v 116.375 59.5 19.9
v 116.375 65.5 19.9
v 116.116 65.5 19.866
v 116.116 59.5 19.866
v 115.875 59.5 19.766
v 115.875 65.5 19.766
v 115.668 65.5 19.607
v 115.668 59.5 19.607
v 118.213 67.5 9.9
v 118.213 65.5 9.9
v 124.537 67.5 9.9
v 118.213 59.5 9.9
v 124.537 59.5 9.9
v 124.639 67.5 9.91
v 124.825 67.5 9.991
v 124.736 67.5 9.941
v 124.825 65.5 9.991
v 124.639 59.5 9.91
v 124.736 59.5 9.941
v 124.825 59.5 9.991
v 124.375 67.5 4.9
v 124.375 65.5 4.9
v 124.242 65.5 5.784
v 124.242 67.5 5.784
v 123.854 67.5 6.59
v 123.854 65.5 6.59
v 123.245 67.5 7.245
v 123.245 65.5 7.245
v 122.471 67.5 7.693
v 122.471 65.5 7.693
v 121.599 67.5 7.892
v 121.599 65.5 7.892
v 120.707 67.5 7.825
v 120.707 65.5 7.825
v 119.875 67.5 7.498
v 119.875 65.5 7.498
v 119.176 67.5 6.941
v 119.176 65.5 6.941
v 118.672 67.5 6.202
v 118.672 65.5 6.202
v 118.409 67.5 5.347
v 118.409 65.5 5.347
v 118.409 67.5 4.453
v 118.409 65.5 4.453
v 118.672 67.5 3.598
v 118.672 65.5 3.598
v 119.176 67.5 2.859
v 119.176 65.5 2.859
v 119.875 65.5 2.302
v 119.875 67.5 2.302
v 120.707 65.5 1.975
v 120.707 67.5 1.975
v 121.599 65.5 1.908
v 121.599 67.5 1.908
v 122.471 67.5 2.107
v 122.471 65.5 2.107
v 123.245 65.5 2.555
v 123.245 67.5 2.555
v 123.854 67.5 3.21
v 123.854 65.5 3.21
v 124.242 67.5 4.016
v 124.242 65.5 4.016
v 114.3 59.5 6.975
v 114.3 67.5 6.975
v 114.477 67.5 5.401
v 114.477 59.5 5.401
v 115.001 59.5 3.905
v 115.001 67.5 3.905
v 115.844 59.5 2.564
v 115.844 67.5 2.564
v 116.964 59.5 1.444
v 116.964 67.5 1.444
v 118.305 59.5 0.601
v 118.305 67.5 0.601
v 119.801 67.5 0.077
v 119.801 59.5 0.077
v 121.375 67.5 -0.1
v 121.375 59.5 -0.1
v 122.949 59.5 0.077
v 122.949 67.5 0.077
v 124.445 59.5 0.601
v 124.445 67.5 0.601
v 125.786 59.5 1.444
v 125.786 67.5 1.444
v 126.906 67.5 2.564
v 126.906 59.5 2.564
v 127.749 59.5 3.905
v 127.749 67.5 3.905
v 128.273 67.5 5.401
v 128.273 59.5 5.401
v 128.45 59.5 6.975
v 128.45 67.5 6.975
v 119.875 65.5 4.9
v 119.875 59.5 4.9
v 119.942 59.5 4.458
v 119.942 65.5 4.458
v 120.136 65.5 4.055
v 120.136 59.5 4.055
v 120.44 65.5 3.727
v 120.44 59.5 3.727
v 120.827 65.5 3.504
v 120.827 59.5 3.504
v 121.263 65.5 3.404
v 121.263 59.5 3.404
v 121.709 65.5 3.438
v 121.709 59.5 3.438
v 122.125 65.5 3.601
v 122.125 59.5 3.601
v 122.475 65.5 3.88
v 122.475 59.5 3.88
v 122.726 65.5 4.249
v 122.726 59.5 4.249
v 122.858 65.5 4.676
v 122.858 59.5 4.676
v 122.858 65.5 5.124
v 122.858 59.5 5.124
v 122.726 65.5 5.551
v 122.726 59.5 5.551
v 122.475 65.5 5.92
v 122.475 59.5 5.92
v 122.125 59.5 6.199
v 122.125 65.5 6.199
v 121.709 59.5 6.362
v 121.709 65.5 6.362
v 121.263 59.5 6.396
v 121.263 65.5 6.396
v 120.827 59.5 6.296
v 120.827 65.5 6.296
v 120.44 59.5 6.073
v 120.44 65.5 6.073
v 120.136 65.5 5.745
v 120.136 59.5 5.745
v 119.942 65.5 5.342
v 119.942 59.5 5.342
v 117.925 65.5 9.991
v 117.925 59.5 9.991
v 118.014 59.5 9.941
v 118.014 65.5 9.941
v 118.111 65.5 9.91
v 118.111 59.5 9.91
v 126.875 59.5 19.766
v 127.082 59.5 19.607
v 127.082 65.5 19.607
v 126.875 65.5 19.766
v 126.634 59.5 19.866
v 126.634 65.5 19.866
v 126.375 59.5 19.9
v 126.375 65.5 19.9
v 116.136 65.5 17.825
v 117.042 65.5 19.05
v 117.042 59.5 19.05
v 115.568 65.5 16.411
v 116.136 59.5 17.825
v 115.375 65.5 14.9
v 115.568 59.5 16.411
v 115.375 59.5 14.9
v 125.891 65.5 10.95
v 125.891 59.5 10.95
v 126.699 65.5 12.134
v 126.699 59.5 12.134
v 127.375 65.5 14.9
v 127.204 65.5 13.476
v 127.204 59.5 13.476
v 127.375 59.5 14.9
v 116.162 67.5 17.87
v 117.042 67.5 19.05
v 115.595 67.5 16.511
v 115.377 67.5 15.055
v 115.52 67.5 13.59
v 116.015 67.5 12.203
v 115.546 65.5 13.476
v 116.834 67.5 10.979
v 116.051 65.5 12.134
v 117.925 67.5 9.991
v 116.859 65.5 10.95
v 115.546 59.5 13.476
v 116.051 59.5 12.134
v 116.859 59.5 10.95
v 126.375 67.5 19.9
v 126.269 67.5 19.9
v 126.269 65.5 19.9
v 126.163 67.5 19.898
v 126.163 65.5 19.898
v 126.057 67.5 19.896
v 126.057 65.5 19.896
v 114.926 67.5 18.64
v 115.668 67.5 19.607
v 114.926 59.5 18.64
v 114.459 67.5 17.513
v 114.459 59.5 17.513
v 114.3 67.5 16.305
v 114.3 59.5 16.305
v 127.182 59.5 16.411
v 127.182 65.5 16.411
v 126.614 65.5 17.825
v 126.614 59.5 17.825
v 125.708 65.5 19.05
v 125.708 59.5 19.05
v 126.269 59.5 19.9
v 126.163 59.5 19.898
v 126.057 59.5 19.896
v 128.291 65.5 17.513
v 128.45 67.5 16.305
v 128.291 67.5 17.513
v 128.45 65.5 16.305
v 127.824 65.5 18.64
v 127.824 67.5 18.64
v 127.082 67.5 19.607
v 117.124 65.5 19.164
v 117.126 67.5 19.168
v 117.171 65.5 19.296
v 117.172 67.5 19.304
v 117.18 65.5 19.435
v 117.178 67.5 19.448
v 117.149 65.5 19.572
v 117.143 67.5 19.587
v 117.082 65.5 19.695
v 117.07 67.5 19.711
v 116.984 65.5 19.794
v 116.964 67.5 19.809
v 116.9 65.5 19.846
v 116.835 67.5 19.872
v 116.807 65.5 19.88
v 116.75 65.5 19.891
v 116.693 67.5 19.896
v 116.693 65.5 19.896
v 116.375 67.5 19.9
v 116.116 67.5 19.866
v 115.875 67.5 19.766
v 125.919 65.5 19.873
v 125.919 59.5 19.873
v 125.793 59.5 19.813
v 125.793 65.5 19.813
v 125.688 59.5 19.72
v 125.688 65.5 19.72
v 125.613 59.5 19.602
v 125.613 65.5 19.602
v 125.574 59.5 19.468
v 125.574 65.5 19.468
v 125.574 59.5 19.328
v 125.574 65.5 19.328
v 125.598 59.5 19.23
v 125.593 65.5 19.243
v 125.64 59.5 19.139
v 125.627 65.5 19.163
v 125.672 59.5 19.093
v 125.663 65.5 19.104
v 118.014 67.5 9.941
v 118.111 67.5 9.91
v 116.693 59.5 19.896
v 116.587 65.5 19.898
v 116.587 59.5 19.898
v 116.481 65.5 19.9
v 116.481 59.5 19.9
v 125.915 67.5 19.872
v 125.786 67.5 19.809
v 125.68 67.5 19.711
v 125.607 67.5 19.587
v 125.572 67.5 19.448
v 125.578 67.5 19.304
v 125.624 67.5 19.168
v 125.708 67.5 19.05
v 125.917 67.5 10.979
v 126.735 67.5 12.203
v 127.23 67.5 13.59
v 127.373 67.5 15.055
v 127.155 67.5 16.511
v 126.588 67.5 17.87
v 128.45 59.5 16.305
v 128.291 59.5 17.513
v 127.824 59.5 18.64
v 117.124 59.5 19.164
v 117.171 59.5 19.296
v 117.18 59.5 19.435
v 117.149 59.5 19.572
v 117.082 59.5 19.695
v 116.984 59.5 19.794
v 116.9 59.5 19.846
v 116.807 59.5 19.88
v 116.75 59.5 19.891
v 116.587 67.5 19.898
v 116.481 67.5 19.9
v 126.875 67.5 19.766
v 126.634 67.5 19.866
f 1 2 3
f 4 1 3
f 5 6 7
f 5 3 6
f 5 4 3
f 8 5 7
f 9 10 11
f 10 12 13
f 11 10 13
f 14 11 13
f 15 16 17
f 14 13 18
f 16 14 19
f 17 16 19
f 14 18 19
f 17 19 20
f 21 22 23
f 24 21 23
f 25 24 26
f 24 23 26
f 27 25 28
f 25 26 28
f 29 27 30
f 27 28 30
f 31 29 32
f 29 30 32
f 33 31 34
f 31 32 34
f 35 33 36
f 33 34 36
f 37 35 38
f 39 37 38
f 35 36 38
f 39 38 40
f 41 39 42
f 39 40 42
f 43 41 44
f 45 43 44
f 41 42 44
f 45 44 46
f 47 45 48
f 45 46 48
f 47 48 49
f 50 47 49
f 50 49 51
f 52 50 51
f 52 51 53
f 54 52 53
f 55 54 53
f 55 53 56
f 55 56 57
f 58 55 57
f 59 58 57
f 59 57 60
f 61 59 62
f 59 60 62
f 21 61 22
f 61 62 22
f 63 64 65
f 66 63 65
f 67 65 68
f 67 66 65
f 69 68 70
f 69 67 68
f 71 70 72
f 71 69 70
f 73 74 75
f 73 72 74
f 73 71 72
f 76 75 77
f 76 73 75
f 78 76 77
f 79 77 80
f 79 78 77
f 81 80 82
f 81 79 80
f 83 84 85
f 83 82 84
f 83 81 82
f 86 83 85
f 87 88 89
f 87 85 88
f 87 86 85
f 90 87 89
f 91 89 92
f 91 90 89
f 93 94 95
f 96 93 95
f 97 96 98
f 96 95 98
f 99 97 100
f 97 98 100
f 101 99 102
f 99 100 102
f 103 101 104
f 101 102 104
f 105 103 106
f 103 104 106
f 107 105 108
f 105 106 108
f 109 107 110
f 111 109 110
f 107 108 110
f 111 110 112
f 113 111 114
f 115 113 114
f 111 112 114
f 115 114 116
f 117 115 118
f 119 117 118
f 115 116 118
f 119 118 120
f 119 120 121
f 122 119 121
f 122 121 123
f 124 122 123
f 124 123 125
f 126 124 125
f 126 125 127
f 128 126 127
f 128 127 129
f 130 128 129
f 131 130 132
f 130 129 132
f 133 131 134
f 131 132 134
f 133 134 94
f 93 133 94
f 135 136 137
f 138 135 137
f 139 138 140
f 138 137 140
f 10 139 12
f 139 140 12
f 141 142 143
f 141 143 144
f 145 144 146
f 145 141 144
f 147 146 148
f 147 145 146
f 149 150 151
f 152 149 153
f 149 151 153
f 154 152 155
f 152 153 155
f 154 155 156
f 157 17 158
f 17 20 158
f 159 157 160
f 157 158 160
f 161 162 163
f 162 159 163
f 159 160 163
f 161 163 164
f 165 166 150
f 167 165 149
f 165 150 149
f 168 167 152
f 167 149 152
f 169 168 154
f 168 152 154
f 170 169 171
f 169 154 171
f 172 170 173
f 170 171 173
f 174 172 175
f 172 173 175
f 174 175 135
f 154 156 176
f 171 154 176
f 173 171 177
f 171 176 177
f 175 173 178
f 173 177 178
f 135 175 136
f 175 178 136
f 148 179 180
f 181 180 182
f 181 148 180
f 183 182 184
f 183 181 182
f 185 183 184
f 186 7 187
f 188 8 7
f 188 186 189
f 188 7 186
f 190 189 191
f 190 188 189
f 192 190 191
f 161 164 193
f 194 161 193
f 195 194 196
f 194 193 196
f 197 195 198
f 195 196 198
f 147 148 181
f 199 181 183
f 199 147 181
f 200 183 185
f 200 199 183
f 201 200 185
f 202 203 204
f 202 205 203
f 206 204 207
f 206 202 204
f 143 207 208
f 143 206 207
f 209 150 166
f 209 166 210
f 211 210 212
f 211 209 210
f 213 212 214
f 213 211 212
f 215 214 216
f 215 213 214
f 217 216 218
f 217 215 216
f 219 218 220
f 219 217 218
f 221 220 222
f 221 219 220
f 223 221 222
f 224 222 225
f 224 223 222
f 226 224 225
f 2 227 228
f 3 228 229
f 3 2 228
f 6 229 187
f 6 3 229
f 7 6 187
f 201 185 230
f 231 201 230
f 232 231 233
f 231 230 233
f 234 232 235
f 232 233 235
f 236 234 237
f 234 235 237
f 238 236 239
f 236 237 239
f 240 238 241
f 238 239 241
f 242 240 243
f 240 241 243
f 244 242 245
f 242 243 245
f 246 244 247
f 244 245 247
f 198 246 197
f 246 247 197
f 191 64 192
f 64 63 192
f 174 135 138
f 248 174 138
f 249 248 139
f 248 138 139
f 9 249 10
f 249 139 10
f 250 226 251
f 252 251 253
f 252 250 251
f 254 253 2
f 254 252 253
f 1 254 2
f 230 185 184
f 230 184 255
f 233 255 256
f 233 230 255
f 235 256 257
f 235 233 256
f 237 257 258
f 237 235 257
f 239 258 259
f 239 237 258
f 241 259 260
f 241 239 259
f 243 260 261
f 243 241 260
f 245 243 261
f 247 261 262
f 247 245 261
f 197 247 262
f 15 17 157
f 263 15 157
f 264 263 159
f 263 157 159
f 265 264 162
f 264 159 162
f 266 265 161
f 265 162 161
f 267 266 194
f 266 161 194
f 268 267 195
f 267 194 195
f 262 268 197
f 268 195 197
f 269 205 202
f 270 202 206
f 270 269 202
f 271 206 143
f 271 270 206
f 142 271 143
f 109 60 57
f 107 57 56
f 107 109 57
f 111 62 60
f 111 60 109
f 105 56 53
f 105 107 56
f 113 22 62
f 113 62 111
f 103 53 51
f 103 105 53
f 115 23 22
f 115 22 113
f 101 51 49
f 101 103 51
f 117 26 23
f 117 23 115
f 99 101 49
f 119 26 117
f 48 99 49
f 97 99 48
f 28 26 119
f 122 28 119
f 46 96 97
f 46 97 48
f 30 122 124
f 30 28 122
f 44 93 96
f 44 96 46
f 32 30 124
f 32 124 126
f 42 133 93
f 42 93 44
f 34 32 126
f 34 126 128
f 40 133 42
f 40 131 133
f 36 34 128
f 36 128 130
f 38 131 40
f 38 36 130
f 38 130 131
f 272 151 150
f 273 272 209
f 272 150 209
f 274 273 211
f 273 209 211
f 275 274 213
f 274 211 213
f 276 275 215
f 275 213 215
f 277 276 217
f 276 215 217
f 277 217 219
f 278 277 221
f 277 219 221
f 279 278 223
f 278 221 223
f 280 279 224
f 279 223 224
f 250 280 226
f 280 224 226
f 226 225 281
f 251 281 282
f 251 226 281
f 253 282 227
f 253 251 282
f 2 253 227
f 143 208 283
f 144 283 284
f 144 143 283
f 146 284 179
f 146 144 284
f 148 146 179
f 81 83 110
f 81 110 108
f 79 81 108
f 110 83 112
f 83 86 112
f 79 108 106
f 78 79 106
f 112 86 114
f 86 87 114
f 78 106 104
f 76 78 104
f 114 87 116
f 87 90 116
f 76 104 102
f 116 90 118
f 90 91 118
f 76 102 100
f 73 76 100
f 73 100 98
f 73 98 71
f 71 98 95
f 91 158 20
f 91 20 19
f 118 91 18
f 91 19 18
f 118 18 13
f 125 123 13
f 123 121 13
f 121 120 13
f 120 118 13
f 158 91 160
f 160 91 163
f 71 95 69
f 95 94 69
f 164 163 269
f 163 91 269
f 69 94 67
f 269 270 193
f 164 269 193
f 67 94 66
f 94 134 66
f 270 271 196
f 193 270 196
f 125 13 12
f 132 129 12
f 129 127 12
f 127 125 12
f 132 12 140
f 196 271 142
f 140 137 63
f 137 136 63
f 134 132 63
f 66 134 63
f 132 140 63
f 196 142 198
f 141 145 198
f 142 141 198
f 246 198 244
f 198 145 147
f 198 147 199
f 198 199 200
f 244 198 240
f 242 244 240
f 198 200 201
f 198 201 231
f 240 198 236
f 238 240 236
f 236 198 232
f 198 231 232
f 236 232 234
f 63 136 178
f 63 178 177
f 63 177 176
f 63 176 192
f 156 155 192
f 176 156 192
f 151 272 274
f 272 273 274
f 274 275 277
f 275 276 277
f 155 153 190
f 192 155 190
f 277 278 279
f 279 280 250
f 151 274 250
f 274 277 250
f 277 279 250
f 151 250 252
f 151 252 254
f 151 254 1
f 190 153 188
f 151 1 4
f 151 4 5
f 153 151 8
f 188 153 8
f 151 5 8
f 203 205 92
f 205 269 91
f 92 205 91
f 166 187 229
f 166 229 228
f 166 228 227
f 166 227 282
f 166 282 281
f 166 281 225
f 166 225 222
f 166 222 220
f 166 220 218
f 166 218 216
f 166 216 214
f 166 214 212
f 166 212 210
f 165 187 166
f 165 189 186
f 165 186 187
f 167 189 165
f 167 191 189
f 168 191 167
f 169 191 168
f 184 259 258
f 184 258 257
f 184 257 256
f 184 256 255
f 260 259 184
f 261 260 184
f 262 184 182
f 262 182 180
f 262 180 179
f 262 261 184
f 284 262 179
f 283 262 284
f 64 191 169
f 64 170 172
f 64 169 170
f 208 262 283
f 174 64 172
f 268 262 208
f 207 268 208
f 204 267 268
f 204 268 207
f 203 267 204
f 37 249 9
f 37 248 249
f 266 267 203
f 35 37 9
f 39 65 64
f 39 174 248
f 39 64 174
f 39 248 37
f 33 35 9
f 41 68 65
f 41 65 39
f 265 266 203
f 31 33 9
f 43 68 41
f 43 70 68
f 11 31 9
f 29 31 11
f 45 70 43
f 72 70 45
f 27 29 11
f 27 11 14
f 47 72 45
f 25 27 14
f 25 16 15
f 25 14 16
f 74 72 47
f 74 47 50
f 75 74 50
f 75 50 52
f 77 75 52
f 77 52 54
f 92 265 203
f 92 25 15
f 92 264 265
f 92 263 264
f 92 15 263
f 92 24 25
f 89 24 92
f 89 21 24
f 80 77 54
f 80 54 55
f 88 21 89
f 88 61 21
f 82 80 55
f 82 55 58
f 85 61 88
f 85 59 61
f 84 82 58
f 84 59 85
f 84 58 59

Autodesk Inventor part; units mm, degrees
ref_plane "YZ Plane" through (0, 0, 0) normal (1, 0, 0) x (0, 1, 0)
ref_plane "XZ Plane" through (0, 0, 0) normal (0, 1, 0) x (-1, 0, 0)
sketch "Sketch1" plane through (0, 0, 0) normal (0, 1, 0) x (-1, 0, 0)
  line L0 (-113.9895, -20.65) -> (-113.9895, -0.1) projected
  line L1 (-105.9, -20.65) -> (-113.9895, -20.65) projected
  line L2 (-105.9, -20.65) -> (-105.9, -19.5) projected
  line L3 (-105.9, -19.5) -> (-112.525, -19.5) projected
  line L4 (-112.525, -19.5) -> (-112.525, 19.5) projected
  line L5 (-112.525, 19.5) -> (-73.775, 19.5) projected
  line L6 (-127.45, 19.9) -> (-115.3, 19.9) projected
  line L7 (-115.3, 19.9) -> (-115.3, 9.9) projected
  line L8 (-115.3, 9.9) -> (-127.45, 9.9) projected
  line L9 (-127.45, 9.9) -> (-127.45, 19.9) projected
  line L10 (-124.5373, 9.9) -> (-126.375, 9.9) projected
  arc A0 (-124.8248, 9.9909) -> (-124.5373, 9.9) centre (-124.5373, 10.4) ccw projected
  arc A1 (-127.375, 14.9) -> (-124.8248, 9.9909) centre (-121.375, 14.9) ccw projected
  line L11 (-127.375, 10.9) -> (-127.375, 14.9) projected
  arc A2 (-127.375, 10.9) -> (-126.375, 9.9) centre (-126.375, 10.9) ccw projected
  line L12 (-127.375, 14.9) -> (-127.375, 18.9) projected
  arc A3 (-124.8248, 19.8091) -> (-127.375, 14.9) centre (-121.375, 14.9) ccw projected
  arc A4 (-124.5373, 19.9) -> (-124.8248, 19.8091) centre (-124.5373, 19.4) ccw projected
  line L13 (-126.375, 19.9) -> (-124.5373, 19.9) projected
  arc A5 (-126.375, 19.9) -> (-127.375, 18.9) centre (-126.375, 18.9) ccw projected
  line L14 (-118.2127, 19.9) -> (-116.375, 19.9) projected
  arc A6 (-117.9252, 19.8091) -> (-118.2127, 19.9) centre (-118.2127, 19.4) ccw projected
  arc A7 (-115.375, 14.9) -> (-117.9252, 19.8091) centre (-121.375, 14.9) ccw projected
  line L15 (-115.375, 18.9) -> (-115.375, 14.9) projected
  arc A8 (-115.375, 18.9) -> (-116.375, 19.9) centre (-116.375, 18.9) ccw projected
  line L16 (-115.375, 14.9) -> (-115.375, 10.9) projected
  arc A9 (-117.9252, 9.9909) -> (-115.375, 14.9) centre (-121.375, 14.9) ccw projected
  arc A10 (-118.2127, 9.9) -> (-117.9252, 9.9909) centre (-118.2127, 10.4) ccw projected
  line L17 (-116.375, 9.9) -> (-118.2127, 9.9) projected
  arc A11 (-116.375, 9.9) -> (-115.375, 10.9) centre (-116.375, 10.9) ccw projected
  arc A12 (-118.2127, 9.9) -> (-117.9252, 9.9909) centre (-118.2127, 10.4) ccw projected
  arc A13 (-117.9252, 9.9909) -> (-117.9252, 19.8091) centre (-121.375, 14.9) ccw projected
  arc A14 (-117.9252, 19.8091) -> (-118.2127, 19.9) centre (-118.2127, 19.4) ccw projected
  line L18 (-118.2127, 19.9) -> (-124.5373, 19.9) projected
  arc A15 (-124.5373, 19.9) -> (-124.8248, 19.8091) centre (-124.5373, 19.4) ccw projected
  arc A16 (-124.8248, 19.8091) -> (-124.8248, 9.9909) centre (-121.375, 14.9) ccw projected
  arc A17 (-124.8248, 9.9909) -> (-124.5373, 9.9) centre (-124.5373, 10.4) ccw projected
  line L19 (-124.5373, 9.9) -> (-118.2127, 9.9) projected
  line L20 (-73.775, 19.5) -> (-73.775, 20.65) projected
  line L21 (-115.3, 19.9) -> (-115.3, 9.9)
  line L22 (-115.3, 9.9) -> (-114.3, 9.9)
  line L23 (-114.3, 9.9) -> (-114.3, 19.9)
  line L24 (-114.3, 19.9) -> (-115.3, 19.9)
  line L25 (-121.375, 14.9) -> (-121.375, 19.9)
  arc A18 (-114.3, 16.3047) -> (-115.6679, 19.6071) centre (-118.9703, 16.3047) ccw
  arc A19 (-116.375, 19.9) -> (-117.9252, 19.8091) centre (-116.375, 6.6367) ccw
  line L26 (-127.45, 19.9) -> (-127.45, 9.9)
  line L27 (-127.45, 9.9) -> (-128.45, 9.9)
  line L28 (-128.45, 9.9) -> (-128.45, 19.9)
  line L29 (-128.45, 19.9) -> (-127.45, 19.9)
  arc A20 (-127.0821, 19.6071) -> (-128.45, 16.3047) centre (-123.7797, 16.3047) ccw
  arc A21 (-124.8248, 19.8091) -> (-126.375, 19.9) centre (-126.375, 6.6367) ccw
  line L30 (-114.3, 9.9) -> (-128.45, 9.9)
  line L31 (-128.45, 9.9) -> (-128.45, -0.1)
  line L32 (-128.45, -0.1) -> (-114.3, -0.1)
  line L33 (-114.3, -0.1) -> (-114.3, 9.9)
  line L34 (-121.375, 9.9) -> (-121.375, -0.1)
  circle A22 centre (-121.375, 4.9) radius 1.5
  circle A23 centre (-121.375, 4.9) radius 3
  arc A24 (-121.375, -0.1) -> (-114.3, 6.975) centre (-121.375, 6.975) ccw
  arc A25 (-128.45, 6.975) -> (-121.375, -0.1) centre (-121.375, 6.975) ccw
  line L35 (-128.9145, -0.1) -> (-128.9145, 20.65) projected
  line L36 (-128.9145, -0.1) -> (-113.9895, -0.1) projected
  line L37 (-128.9145, 20.65) -> (-73.775, 20.65) projected
  circle A26 centre (-121.375, 4.9163) radius 1.4375 projected
  point P0 (0, 0)
  point P1 (-135.6645, 14.9)
  dimension "d18" = 1
  dimension "d20" = 3
  dimension "d21" = 6
  dimension "d22" = 10
ref_plane "Work Plane1" through (127.45, 59.5, 9.9) normal (0, 1, 0) x (1, 0, 0)
extrude "Extrusion1" add sketch "Sketch1" along normal blind 6 from surface at 59.5 contours A25 L31 L27 L8 L34 A23 | L34 A23 L8 L22 L33 A24 | A23 L34 A22 | L34 A22 A23 | L22 L7 A18 L23 | L28 A20 L9 L27 | L8 A11 L16 L15 A8 A18 L7 | L9 A20 A5 L12 L11 A2 L8 | L8 A10 A9 L16 A11 | L8 A2 L11 A1 A0 | A8 L15 A7 A19 | A5 A21 A3 L12
fillet "Fillet1" radius 0.5 2 edges at (117.9252, 62.5, 19.8091) (124.8248, 62.5, 19.8091)
sketch "Sketch2" plane through (118.1857, 65.5, 20.6175) normal (0, 1, 0) x (1, 0, 0)
  arc A0 (-0.2604, 10.6266) -> (-1.1435, 1.567) centre (3.1893, 5.7175) ccw projected
  arc A1 (0.0271, 10.7175) -> (-0.2604, 10.6266) centre (0.0271, 10.2175) ccw projected
  line L0 (6.3516, 10.7175) -> (0.0271, 10.7175) projected
  arc A2 (6.6391, 10.6266) -> (6.3516, 10.7175) centre (6.3516, 10.2175) ccw projected
  arc A3 (7.5222, 1.567) -> (6.6391, 10.6266) centre (3.1893, 5.7175) ccw projected
  circle A4 centre (3.1893, 15.7175) radius 3
  arc A5 (10.2643, 13.6425) -> (-3.8857, 13.6425) centre (3.1893, 13.6425) ccw projected
  line L1 (-3.8857, 4.3128) -> (-3.8857, 13.6425) projected
  arc A6 (-3.8857, 4.3128) -> (-2.5178, 1.0104) centre (0.7846, 4.3128) ccw projected
  arc A7 (-2.5178, 1.0104) -> (-1.8107, 0.7175) centre (-1.8107, 1.7175) ccw projected
  arc A8 (-1.8107, 0.7175) -> (-1.4926, 0.7213) centre (-1.8107, 13.9808) ccw projected
  arc A9 (7.8713, 0.7213) -> (8.1893, 0.7175) centre (8.1893, 13.9808) ccw projected
  arc A10 (8.1893, 0.7175) -> (8.8964, 1.0104) centre (8.1893, 1.7175) ccw projected
  arc A11 (8.8964, 1.0104) -> (10.2643, 4.3128) centre (5.5941, 4.3128) ccw projected
  line L2 (10.2643, 13.6425) -> (10.2643, 4.3128) projected
  line L3 (3.1893, 10.7175) -> (3.1893, 20.7175)
  arc A12 (7.5222, 1.567) -> (7.8713, 0.7213) centre (7.8833, 1.2212) ccw projected
  arc A13 (-1.4926, 0.7213) -> (-1.1435, 1.567) centre (-1.5046, 1.2212) ccw projected
  point P0 (-118.1857, 20.6175)
  dimension "d10" = 6
extrude "Extrusion2" add sketch "Sketch2" along normal blind 2 contours A0 A13 A8 A7 A6 L1 A5 L3 A4 L0 A1 | L3 A4 A5 L2 A11 A10 A9 A12 A3 A2 L0
properties part number "Z Stage Motor Clamp V5"
